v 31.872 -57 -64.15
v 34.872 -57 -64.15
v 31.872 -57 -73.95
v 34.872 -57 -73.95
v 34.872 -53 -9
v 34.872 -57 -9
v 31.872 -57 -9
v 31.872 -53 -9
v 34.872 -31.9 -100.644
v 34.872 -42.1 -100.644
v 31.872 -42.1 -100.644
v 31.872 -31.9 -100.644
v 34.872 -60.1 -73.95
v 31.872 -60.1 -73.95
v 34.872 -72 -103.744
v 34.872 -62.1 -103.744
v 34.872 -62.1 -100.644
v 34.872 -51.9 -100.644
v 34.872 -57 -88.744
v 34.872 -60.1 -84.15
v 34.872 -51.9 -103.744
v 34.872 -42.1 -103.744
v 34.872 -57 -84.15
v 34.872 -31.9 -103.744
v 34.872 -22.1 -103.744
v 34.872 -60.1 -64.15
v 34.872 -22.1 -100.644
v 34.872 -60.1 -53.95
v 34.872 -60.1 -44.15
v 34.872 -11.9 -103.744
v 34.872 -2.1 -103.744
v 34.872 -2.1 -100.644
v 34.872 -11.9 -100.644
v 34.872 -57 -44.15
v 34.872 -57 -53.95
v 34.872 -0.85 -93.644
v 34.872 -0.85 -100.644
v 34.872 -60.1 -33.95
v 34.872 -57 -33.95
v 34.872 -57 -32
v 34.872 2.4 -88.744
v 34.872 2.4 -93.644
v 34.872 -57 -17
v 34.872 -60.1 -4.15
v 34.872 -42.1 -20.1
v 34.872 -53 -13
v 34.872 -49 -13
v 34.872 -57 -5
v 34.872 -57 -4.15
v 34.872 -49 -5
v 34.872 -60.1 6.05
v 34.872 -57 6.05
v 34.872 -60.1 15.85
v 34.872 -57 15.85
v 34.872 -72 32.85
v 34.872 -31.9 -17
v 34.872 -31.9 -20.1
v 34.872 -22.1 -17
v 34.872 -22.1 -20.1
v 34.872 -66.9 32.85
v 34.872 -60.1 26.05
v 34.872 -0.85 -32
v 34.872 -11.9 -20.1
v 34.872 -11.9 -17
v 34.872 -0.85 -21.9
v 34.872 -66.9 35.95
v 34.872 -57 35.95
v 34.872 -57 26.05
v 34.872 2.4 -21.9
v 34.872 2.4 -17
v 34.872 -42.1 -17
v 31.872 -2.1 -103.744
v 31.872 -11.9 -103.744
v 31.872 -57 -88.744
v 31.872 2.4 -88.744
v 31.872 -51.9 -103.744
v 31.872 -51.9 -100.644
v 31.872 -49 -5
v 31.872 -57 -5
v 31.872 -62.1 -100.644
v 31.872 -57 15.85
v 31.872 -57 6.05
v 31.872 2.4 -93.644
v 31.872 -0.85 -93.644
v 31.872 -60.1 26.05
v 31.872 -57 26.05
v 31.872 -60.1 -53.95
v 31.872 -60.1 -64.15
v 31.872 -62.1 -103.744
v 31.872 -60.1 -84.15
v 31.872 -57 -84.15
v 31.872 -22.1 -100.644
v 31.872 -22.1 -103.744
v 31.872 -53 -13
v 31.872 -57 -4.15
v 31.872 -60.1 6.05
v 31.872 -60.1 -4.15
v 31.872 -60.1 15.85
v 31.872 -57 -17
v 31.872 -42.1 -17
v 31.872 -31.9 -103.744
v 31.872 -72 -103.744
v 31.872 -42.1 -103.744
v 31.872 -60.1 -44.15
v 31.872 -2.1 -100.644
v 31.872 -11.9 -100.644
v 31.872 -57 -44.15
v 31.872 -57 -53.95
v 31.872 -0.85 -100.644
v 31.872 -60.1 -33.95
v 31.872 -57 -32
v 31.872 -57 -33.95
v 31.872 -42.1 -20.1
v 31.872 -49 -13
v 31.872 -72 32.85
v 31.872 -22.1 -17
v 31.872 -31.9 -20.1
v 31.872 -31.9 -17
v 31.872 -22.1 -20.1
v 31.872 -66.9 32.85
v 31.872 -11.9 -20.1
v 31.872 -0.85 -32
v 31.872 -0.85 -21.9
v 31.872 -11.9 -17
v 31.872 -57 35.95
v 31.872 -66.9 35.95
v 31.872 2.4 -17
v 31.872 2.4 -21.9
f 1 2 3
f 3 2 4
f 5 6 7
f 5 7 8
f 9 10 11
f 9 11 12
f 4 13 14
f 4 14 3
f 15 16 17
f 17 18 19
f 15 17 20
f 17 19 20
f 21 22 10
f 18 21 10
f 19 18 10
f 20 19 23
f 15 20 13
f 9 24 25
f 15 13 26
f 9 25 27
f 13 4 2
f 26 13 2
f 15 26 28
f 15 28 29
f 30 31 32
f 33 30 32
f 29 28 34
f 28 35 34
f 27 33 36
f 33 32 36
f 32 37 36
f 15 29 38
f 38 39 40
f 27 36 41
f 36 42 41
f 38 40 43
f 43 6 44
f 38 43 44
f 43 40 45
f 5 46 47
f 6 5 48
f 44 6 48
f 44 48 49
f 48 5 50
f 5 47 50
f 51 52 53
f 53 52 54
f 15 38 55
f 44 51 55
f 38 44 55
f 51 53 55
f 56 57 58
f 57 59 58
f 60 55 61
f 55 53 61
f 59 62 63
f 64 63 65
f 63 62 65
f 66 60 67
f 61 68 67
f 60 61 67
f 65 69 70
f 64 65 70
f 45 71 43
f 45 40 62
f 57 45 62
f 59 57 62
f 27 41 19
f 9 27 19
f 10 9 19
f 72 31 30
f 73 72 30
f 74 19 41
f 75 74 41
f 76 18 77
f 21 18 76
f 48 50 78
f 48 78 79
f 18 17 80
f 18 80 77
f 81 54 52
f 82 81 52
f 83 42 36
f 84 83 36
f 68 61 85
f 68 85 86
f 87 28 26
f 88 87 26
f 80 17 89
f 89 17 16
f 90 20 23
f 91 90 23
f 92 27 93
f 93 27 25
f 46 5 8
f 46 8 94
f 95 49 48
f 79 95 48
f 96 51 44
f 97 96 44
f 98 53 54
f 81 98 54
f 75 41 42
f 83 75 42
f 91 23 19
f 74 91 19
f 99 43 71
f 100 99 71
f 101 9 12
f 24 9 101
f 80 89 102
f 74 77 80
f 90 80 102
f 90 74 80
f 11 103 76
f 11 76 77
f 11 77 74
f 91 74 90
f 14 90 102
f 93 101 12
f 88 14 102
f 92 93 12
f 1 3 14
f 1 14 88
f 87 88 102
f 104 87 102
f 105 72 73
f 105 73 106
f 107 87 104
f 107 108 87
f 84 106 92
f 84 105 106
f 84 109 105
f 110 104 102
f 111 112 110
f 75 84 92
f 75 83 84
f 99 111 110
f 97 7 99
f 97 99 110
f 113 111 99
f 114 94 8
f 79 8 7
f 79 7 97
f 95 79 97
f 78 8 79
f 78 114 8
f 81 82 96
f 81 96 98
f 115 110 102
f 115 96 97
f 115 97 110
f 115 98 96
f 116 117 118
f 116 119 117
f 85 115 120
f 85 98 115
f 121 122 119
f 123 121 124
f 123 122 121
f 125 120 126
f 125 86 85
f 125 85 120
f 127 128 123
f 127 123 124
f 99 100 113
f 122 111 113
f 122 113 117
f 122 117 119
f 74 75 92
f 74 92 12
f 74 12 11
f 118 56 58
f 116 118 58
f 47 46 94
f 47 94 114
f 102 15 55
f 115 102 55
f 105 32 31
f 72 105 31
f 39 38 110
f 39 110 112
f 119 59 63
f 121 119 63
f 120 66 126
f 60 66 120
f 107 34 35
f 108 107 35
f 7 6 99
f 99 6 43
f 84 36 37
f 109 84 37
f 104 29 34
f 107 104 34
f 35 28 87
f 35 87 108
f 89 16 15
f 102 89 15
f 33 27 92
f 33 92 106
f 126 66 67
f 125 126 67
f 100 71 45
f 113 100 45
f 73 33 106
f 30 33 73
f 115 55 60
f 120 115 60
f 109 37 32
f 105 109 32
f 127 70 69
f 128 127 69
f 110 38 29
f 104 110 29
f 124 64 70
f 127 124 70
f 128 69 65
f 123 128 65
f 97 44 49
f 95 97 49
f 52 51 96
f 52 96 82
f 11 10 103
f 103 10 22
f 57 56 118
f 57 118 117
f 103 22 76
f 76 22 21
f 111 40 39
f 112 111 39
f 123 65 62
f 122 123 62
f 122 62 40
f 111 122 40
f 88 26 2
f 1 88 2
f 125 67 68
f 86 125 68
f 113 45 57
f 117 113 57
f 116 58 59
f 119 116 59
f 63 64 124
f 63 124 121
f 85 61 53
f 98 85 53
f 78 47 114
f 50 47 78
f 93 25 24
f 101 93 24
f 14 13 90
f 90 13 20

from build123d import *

# Parameters (mm, degrees)
BOSS_EXTRUDE1_DEPTH = 3
SKETCH6_W           = 3.2
SKETCH6_H           = 10.2
SKETCH6_H_2         = 5.2
SKETCH6_W_2         = 10.2
SKETCH6_H_3         = 3.2
CUT_EXTRUDE1_DEPTH  = 4
BOSS_EXTRUDE2_DEPTH = 3


with BuildPart() as part:
    # Sketch2 → Boss-Extrude1 (new body)
    with BuildSketch(Plane(origin=(34.872217102, 0, 0), x_dir=(0, 0, -1), z_dir=(1, 0, 0))):
        Polygon((103.744434203, 3), (103.744434203, -72), (-35.95, -72), (-35.95, -57), (17, -57), (17, 3), (32, 3), (32, -57), (88.744434203, -57), (88.744434203, 3), align=None)
    extrude(amount=-BOSS_EXTRUDE1_DEPTH)

    # Sketch6 → Cut-Extrude1 (cut, through all)
    with BuildSketch(Plane(origin=(34.872217102, 0, 0), x_dir=(0, 0, -1), z_dir=(1, 0, 0))):
        with Locations((102.244434203, -37)):
            Rectangle(SKETCH6_W, SKETCH6_H)
        with Locations((102.244434203, -57)):
            Rectangle(SKETCH6_W, SKETCH6_H)
        with Locations((102.244434203, -17)):
            Rectangle(SKETCH6_W, SKETCH6_H)
        with Locations((-34.45, -69.5)):
            Rectangle(SKETCH6_W, SKETCH6_H_2)
        with Locations((-20.95, -58.5)):
            Rectangle(SKETCH6_W_2, SKETCH6_H_3)
        with Locations((39.05, -58.5)):
            Rectangle(SKETCH6_W_2, SKETCH6_H_3)
        with Locations((-0.95, -58.5)):
            Rectangle(SKETCH6_W_2, SKETCH6_H_3)
        with Locations((18.5, -17)):
            Rectangle(SKETCH6_W, SKETCH6_H)
        with Locations((79.05, -58.5)):
            Rectangle(SKETCH6_W_2, SKETCH6_H_3)
        with Locations((59.05, -58.5)):
            Rectangle(SKETCH6_W_2, SKETCH6_H_3)
        Polygon((16.9, 2.4), (21.9, 2.4), (21.9, -0.85), (32.1, -0.85), (32.1, 3.1), (16.9, 3.1), align=None)
        Polygon((93.644434203, -0.85), (100.644434203, -0.85), (100.644434203, -2.1), (103.844434203, -2.1), (103.844434203, 3.1), (88.644434203, 3.1), (88.644434203, 2.4), (93.644434203, 2.4), align=None)
        with Locations((18.5, -37)):
            Rectangle(SKETCH6_W, SKETCH6_H)
    extrude(amount=-CUT_EXTRUDE1_DEPTH, mode=Mode.SUBTRACT)

    # Sketch8 → Boss-Extrude2 (add)
    with BuildSketch(Plane(origin=(34.872217102, 0, 0), x_dir=(0, 0, -1), z_dir=(1, 0, 0))):
        Polygon((13, -53), (13, -49), (5, -49), (5, -57), (9, -57), (9, -53), align=None)
    extrude(amount=-BOSS_EXTRUDE2_DEPTH)


solid = part.part
